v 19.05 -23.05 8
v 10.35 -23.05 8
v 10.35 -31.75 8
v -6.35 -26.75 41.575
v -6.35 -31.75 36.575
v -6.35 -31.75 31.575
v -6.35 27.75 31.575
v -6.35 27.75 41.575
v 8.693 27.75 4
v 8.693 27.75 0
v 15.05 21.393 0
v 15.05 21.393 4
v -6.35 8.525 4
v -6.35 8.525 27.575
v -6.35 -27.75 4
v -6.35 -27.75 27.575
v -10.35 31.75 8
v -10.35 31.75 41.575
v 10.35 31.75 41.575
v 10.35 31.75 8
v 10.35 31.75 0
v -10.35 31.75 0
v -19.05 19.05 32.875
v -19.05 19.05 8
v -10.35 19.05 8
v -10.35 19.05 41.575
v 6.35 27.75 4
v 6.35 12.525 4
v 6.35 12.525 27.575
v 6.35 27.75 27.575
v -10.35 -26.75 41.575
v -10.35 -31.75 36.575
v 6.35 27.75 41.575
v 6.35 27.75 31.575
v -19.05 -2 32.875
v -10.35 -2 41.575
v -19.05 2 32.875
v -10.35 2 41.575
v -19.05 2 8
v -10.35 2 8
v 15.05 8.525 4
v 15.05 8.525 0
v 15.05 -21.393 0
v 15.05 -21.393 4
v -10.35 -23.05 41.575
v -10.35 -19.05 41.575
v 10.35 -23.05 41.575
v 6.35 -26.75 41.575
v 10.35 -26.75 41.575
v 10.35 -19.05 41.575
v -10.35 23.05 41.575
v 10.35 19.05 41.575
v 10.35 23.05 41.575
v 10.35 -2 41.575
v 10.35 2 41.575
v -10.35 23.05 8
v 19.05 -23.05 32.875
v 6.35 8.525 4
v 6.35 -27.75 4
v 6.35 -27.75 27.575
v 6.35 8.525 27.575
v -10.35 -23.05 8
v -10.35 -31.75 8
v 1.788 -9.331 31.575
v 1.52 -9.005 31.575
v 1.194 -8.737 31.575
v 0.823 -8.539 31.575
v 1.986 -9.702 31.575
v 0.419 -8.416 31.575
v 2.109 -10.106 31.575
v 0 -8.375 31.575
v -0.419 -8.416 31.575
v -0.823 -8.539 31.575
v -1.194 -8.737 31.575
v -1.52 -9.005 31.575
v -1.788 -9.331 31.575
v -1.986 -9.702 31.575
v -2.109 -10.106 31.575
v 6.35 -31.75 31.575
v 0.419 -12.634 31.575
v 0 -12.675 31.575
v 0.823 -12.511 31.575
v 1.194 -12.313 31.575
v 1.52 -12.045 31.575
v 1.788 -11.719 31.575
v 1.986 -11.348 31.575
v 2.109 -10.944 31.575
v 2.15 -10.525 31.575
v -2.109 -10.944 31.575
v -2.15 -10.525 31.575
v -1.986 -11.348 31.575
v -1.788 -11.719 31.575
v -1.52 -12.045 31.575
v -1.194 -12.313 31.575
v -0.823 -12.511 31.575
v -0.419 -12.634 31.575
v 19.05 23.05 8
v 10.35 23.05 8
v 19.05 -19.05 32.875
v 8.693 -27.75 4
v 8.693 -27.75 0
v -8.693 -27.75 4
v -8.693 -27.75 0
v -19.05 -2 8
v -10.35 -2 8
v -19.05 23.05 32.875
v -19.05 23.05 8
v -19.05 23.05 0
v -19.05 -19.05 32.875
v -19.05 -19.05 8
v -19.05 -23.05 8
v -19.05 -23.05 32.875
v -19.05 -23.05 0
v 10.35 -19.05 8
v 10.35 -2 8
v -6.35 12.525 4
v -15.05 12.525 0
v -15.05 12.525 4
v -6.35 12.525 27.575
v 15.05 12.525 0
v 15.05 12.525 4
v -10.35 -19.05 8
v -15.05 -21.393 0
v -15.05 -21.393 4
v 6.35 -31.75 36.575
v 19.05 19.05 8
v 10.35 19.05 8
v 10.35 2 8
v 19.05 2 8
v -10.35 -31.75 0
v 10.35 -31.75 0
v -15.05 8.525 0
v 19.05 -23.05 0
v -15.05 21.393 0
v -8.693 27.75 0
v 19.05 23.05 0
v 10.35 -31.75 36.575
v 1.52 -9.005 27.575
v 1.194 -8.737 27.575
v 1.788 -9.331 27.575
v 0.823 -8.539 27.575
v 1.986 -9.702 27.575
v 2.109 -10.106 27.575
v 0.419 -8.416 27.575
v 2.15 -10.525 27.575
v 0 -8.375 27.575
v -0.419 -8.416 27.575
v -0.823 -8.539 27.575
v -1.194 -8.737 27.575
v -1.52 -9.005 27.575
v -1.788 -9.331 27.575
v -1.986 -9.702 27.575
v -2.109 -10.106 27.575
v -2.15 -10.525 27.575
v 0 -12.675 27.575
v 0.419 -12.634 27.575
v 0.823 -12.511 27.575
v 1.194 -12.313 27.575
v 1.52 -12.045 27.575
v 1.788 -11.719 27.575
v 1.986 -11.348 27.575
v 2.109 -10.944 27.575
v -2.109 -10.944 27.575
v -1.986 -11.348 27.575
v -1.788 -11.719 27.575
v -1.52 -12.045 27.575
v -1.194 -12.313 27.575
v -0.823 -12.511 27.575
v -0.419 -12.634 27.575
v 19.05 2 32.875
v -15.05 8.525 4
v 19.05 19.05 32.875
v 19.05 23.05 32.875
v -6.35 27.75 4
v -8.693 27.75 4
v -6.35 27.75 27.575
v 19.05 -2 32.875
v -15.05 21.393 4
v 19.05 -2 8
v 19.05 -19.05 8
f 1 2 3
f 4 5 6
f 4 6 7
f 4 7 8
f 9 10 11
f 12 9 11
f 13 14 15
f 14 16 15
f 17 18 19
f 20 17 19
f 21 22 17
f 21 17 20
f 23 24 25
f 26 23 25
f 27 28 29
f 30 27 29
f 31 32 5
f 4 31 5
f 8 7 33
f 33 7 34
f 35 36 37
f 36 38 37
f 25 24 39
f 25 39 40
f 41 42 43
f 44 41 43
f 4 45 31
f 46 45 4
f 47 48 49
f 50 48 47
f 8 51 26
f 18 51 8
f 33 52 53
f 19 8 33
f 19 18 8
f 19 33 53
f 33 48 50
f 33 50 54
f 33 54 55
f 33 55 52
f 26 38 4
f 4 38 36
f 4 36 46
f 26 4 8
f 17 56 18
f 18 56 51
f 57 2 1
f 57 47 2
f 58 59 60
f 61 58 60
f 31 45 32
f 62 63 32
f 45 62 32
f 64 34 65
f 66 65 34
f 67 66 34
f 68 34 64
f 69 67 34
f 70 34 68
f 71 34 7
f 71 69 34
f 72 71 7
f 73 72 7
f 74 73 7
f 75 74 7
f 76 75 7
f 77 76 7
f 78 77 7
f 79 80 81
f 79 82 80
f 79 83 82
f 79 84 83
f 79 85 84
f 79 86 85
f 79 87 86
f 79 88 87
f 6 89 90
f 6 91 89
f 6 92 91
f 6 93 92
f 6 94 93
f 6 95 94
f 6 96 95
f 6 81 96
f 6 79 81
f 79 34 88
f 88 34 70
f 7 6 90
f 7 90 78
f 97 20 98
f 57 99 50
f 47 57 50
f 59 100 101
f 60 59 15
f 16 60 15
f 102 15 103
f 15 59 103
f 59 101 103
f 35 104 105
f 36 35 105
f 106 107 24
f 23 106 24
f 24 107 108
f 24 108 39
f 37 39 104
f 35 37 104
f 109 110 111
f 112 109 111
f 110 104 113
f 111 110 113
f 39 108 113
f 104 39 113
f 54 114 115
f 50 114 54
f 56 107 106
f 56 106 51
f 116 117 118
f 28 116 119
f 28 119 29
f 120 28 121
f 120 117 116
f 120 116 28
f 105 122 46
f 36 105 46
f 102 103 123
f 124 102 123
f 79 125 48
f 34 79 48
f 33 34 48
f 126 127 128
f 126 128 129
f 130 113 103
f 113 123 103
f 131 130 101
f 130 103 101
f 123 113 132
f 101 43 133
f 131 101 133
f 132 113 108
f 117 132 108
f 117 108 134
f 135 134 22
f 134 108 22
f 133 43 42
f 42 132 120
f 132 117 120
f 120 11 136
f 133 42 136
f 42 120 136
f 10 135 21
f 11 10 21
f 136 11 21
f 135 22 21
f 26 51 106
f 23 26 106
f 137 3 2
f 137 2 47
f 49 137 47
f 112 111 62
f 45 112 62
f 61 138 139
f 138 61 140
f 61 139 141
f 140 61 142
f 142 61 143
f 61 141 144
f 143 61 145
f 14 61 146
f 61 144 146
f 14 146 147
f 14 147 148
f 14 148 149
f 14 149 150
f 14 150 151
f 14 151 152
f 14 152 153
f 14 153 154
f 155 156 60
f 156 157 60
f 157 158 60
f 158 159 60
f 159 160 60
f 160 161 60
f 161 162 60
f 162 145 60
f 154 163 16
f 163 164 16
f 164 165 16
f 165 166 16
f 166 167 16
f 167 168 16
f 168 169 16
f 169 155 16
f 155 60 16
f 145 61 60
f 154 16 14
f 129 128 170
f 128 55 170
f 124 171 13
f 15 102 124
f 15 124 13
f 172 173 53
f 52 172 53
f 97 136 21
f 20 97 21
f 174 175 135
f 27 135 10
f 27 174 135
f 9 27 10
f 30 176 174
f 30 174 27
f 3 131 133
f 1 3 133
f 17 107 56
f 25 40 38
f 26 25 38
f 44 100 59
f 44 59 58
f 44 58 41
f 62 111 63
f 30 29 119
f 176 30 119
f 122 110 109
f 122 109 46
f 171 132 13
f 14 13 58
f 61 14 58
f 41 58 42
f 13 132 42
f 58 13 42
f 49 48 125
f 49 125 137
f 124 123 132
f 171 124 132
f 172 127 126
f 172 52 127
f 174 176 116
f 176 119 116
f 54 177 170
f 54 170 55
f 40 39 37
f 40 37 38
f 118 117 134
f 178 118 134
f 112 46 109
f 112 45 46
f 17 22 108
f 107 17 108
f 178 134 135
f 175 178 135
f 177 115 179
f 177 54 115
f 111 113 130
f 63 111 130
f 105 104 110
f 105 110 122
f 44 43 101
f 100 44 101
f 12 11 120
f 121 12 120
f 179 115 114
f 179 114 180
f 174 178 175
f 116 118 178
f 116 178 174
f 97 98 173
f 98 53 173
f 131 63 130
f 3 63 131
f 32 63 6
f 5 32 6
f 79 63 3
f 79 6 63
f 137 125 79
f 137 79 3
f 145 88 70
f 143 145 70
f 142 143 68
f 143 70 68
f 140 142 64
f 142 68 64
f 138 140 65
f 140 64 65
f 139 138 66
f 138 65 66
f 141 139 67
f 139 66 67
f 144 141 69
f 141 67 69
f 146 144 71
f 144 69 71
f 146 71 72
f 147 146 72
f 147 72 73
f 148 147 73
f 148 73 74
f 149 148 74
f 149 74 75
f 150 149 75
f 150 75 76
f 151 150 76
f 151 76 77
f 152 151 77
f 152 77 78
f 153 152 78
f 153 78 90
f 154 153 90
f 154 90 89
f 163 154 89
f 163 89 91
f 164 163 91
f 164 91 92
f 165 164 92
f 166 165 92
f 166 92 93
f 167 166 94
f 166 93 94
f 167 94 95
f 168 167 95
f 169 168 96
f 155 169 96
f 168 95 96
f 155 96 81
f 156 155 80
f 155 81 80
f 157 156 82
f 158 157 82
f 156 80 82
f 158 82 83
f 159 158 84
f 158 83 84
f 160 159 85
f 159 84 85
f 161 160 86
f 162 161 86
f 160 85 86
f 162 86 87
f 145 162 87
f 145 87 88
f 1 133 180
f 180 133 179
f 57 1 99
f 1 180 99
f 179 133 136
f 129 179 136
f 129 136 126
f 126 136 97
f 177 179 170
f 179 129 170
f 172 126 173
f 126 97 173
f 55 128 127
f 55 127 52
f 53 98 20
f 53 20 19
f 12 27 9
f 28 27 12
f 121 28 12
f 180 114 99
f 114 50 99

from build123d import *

# Parameters (mm, degrees)
F1_DEPTH  = 31.75
F2_T      = -4
F3_W      = 4
F3_H      = 10
F4_DEPTH  = 63.5
F6_DEPTH  = 8
F8_DEPTH  = 2
F11_DEPTH = 4
F13_DEPTH = 4
F14_W     = 12.7
F14_H     = 4
F15_DEPTH = 10
F16_SIZE  = 5
F17_R     = 2.15
F18_DEPTH = 25
F19_W     = 30.1
F19_H     = 4


# Not quite as in the source:
# - a pattern or mirror of a feature is missing from the dataset's text; its kind, count and spacing are read off the source's solid


with BuildPart() as f1:
    # F0 (on Front) → F1 (new body, symmetric)
    with BuildSketch(Plane.XZ):
        Polygon((-10.35, 0), (10.35, 0), (10.35, 31.575), (6.35, 31.575), (-6.35, 31.575), (-10.35, 31.575), align=None)
    extrude(amount=F1_DEPTH, both=True)

    # F2
    f2_openings = [f1.faces().sort_by_distance(p)[0] for p in [
        (0, 0, 0),
    ]]
    offset(amount=F2_T, openings=f2_openings)

    # F3 (on face) → F4 (join, through all)
    with BuildSketch(Plane.XZ.offset(31.75)):
        with Locations((-8.35, 36.575)):
            Rectangle(F3_W, F3_H)
        with Locations((8.35, 36.575)):
            Rectangle(F3_W, F3_H)
    extrude(amount=-F4_DEPTH)

    # F5 (on Top) → F6 (join)
    with BuildSketch(Plane.XY):
        Polygon((-19.05, -23.05), (-10.35, -31.75), (-10.35, 31.75), (-19.05, 23.05), align=None)
        Polygon((10.35, 31.75), (10.35, -31.75), (19.05, -23.05), (19.05, 23.05), align=None)
    extrude(amount=F6_DEPTH)

    # F7 (on Front) → F8 (join, symmetric)
    with BuildSketch(Plane.XZ):
        Polygon((-19.05, 8), (-10.35, 8), (-10.35, 41.575), (-19.05, 32.875), align=None)
        Polygon((10.35, 8), (19.05, 8), (19.05, 32.875), (10.35, 41.575), align=None)
    f8 = extrude(amount=F8_DEPTH, both=True)

    # F8_copies: F8 across plane
    add(f8.mirror(Plane(origin=(0, -10.525, 0), x_dir=(0, 0, -1), z_dir=(0, -1, 0))))

    # F10 (on plane+point) → F11 (join)
    with BuildSketch(Plane.XZ.offset(-23.05)):
        Polygon((10.35, 8), (19.05, 8), (19.05, 32.875), (10.35, 41.575), align=None)
        Polygon((-19.05, 32.875), (-19.05, 8), (-10.35, 8), (-10.35, 41.575), align=None)
    extrude(amount=F11_DEPTH)

    # F12 (on face) → F13 (cut)
    with BuildSketch(Plane(origin=(0, 0, 0), x_dir=(1, 0, 0), z_dir=(0, 0, -1))):
        Polygon((-8.6931457505, -27.75), (8.6931457505, -27.75), (15.05, -21.3931457505), (15.05, 21.3931457505), (8.6931457505, 27.75), (-8.6931457505, 27.75), (-15.05, 21.3931457505), (-15.05, -21.3931457505), align=None)
    extrude(amount=-F13_DEPTH, mode=Mode.SUBTRACT)

    # F14 (on face) → F15 (join, through all)
    with BuildSketch(Plane.XY.offset(31.575)):
        with Locations((0, 29.75)):
            Rectangle(F14_W, F14_H)
    extrude(amount=F15_DEPTH)

    # F16
    f16_edges = [f1.edges().sort_by_distance(p)[0] for p in [
        (8.35, -31.75, 41.575),
        (-8.35, -31.75, 41.575),
    ]]
    chamfer(f16_edges, length=F16_SIZE)

    # F17 (on face) → F18 (cut)
    with BuildSketch(Plane.XY.offset(31.575)):
        with Locations((0, -10.525)):
            Circle(F17_R)
    extrude(amount=-F18_DEPTH, mode=Mode.SUBTRACT)

    # F19 (on face) → F20 (join, up to the next surface of F1)
    with BuildSketch(Plane(origin=(0, 0, 0), x_dir=(1, 0, 0), z_dir=(0, 0, -1))):
        with Locations((0, -10.525)):
            Rectangle(F19_W, F19_H)
    extrude(until=Until.NEXT, dir=(0, 0, 1))


solid = f1.part
